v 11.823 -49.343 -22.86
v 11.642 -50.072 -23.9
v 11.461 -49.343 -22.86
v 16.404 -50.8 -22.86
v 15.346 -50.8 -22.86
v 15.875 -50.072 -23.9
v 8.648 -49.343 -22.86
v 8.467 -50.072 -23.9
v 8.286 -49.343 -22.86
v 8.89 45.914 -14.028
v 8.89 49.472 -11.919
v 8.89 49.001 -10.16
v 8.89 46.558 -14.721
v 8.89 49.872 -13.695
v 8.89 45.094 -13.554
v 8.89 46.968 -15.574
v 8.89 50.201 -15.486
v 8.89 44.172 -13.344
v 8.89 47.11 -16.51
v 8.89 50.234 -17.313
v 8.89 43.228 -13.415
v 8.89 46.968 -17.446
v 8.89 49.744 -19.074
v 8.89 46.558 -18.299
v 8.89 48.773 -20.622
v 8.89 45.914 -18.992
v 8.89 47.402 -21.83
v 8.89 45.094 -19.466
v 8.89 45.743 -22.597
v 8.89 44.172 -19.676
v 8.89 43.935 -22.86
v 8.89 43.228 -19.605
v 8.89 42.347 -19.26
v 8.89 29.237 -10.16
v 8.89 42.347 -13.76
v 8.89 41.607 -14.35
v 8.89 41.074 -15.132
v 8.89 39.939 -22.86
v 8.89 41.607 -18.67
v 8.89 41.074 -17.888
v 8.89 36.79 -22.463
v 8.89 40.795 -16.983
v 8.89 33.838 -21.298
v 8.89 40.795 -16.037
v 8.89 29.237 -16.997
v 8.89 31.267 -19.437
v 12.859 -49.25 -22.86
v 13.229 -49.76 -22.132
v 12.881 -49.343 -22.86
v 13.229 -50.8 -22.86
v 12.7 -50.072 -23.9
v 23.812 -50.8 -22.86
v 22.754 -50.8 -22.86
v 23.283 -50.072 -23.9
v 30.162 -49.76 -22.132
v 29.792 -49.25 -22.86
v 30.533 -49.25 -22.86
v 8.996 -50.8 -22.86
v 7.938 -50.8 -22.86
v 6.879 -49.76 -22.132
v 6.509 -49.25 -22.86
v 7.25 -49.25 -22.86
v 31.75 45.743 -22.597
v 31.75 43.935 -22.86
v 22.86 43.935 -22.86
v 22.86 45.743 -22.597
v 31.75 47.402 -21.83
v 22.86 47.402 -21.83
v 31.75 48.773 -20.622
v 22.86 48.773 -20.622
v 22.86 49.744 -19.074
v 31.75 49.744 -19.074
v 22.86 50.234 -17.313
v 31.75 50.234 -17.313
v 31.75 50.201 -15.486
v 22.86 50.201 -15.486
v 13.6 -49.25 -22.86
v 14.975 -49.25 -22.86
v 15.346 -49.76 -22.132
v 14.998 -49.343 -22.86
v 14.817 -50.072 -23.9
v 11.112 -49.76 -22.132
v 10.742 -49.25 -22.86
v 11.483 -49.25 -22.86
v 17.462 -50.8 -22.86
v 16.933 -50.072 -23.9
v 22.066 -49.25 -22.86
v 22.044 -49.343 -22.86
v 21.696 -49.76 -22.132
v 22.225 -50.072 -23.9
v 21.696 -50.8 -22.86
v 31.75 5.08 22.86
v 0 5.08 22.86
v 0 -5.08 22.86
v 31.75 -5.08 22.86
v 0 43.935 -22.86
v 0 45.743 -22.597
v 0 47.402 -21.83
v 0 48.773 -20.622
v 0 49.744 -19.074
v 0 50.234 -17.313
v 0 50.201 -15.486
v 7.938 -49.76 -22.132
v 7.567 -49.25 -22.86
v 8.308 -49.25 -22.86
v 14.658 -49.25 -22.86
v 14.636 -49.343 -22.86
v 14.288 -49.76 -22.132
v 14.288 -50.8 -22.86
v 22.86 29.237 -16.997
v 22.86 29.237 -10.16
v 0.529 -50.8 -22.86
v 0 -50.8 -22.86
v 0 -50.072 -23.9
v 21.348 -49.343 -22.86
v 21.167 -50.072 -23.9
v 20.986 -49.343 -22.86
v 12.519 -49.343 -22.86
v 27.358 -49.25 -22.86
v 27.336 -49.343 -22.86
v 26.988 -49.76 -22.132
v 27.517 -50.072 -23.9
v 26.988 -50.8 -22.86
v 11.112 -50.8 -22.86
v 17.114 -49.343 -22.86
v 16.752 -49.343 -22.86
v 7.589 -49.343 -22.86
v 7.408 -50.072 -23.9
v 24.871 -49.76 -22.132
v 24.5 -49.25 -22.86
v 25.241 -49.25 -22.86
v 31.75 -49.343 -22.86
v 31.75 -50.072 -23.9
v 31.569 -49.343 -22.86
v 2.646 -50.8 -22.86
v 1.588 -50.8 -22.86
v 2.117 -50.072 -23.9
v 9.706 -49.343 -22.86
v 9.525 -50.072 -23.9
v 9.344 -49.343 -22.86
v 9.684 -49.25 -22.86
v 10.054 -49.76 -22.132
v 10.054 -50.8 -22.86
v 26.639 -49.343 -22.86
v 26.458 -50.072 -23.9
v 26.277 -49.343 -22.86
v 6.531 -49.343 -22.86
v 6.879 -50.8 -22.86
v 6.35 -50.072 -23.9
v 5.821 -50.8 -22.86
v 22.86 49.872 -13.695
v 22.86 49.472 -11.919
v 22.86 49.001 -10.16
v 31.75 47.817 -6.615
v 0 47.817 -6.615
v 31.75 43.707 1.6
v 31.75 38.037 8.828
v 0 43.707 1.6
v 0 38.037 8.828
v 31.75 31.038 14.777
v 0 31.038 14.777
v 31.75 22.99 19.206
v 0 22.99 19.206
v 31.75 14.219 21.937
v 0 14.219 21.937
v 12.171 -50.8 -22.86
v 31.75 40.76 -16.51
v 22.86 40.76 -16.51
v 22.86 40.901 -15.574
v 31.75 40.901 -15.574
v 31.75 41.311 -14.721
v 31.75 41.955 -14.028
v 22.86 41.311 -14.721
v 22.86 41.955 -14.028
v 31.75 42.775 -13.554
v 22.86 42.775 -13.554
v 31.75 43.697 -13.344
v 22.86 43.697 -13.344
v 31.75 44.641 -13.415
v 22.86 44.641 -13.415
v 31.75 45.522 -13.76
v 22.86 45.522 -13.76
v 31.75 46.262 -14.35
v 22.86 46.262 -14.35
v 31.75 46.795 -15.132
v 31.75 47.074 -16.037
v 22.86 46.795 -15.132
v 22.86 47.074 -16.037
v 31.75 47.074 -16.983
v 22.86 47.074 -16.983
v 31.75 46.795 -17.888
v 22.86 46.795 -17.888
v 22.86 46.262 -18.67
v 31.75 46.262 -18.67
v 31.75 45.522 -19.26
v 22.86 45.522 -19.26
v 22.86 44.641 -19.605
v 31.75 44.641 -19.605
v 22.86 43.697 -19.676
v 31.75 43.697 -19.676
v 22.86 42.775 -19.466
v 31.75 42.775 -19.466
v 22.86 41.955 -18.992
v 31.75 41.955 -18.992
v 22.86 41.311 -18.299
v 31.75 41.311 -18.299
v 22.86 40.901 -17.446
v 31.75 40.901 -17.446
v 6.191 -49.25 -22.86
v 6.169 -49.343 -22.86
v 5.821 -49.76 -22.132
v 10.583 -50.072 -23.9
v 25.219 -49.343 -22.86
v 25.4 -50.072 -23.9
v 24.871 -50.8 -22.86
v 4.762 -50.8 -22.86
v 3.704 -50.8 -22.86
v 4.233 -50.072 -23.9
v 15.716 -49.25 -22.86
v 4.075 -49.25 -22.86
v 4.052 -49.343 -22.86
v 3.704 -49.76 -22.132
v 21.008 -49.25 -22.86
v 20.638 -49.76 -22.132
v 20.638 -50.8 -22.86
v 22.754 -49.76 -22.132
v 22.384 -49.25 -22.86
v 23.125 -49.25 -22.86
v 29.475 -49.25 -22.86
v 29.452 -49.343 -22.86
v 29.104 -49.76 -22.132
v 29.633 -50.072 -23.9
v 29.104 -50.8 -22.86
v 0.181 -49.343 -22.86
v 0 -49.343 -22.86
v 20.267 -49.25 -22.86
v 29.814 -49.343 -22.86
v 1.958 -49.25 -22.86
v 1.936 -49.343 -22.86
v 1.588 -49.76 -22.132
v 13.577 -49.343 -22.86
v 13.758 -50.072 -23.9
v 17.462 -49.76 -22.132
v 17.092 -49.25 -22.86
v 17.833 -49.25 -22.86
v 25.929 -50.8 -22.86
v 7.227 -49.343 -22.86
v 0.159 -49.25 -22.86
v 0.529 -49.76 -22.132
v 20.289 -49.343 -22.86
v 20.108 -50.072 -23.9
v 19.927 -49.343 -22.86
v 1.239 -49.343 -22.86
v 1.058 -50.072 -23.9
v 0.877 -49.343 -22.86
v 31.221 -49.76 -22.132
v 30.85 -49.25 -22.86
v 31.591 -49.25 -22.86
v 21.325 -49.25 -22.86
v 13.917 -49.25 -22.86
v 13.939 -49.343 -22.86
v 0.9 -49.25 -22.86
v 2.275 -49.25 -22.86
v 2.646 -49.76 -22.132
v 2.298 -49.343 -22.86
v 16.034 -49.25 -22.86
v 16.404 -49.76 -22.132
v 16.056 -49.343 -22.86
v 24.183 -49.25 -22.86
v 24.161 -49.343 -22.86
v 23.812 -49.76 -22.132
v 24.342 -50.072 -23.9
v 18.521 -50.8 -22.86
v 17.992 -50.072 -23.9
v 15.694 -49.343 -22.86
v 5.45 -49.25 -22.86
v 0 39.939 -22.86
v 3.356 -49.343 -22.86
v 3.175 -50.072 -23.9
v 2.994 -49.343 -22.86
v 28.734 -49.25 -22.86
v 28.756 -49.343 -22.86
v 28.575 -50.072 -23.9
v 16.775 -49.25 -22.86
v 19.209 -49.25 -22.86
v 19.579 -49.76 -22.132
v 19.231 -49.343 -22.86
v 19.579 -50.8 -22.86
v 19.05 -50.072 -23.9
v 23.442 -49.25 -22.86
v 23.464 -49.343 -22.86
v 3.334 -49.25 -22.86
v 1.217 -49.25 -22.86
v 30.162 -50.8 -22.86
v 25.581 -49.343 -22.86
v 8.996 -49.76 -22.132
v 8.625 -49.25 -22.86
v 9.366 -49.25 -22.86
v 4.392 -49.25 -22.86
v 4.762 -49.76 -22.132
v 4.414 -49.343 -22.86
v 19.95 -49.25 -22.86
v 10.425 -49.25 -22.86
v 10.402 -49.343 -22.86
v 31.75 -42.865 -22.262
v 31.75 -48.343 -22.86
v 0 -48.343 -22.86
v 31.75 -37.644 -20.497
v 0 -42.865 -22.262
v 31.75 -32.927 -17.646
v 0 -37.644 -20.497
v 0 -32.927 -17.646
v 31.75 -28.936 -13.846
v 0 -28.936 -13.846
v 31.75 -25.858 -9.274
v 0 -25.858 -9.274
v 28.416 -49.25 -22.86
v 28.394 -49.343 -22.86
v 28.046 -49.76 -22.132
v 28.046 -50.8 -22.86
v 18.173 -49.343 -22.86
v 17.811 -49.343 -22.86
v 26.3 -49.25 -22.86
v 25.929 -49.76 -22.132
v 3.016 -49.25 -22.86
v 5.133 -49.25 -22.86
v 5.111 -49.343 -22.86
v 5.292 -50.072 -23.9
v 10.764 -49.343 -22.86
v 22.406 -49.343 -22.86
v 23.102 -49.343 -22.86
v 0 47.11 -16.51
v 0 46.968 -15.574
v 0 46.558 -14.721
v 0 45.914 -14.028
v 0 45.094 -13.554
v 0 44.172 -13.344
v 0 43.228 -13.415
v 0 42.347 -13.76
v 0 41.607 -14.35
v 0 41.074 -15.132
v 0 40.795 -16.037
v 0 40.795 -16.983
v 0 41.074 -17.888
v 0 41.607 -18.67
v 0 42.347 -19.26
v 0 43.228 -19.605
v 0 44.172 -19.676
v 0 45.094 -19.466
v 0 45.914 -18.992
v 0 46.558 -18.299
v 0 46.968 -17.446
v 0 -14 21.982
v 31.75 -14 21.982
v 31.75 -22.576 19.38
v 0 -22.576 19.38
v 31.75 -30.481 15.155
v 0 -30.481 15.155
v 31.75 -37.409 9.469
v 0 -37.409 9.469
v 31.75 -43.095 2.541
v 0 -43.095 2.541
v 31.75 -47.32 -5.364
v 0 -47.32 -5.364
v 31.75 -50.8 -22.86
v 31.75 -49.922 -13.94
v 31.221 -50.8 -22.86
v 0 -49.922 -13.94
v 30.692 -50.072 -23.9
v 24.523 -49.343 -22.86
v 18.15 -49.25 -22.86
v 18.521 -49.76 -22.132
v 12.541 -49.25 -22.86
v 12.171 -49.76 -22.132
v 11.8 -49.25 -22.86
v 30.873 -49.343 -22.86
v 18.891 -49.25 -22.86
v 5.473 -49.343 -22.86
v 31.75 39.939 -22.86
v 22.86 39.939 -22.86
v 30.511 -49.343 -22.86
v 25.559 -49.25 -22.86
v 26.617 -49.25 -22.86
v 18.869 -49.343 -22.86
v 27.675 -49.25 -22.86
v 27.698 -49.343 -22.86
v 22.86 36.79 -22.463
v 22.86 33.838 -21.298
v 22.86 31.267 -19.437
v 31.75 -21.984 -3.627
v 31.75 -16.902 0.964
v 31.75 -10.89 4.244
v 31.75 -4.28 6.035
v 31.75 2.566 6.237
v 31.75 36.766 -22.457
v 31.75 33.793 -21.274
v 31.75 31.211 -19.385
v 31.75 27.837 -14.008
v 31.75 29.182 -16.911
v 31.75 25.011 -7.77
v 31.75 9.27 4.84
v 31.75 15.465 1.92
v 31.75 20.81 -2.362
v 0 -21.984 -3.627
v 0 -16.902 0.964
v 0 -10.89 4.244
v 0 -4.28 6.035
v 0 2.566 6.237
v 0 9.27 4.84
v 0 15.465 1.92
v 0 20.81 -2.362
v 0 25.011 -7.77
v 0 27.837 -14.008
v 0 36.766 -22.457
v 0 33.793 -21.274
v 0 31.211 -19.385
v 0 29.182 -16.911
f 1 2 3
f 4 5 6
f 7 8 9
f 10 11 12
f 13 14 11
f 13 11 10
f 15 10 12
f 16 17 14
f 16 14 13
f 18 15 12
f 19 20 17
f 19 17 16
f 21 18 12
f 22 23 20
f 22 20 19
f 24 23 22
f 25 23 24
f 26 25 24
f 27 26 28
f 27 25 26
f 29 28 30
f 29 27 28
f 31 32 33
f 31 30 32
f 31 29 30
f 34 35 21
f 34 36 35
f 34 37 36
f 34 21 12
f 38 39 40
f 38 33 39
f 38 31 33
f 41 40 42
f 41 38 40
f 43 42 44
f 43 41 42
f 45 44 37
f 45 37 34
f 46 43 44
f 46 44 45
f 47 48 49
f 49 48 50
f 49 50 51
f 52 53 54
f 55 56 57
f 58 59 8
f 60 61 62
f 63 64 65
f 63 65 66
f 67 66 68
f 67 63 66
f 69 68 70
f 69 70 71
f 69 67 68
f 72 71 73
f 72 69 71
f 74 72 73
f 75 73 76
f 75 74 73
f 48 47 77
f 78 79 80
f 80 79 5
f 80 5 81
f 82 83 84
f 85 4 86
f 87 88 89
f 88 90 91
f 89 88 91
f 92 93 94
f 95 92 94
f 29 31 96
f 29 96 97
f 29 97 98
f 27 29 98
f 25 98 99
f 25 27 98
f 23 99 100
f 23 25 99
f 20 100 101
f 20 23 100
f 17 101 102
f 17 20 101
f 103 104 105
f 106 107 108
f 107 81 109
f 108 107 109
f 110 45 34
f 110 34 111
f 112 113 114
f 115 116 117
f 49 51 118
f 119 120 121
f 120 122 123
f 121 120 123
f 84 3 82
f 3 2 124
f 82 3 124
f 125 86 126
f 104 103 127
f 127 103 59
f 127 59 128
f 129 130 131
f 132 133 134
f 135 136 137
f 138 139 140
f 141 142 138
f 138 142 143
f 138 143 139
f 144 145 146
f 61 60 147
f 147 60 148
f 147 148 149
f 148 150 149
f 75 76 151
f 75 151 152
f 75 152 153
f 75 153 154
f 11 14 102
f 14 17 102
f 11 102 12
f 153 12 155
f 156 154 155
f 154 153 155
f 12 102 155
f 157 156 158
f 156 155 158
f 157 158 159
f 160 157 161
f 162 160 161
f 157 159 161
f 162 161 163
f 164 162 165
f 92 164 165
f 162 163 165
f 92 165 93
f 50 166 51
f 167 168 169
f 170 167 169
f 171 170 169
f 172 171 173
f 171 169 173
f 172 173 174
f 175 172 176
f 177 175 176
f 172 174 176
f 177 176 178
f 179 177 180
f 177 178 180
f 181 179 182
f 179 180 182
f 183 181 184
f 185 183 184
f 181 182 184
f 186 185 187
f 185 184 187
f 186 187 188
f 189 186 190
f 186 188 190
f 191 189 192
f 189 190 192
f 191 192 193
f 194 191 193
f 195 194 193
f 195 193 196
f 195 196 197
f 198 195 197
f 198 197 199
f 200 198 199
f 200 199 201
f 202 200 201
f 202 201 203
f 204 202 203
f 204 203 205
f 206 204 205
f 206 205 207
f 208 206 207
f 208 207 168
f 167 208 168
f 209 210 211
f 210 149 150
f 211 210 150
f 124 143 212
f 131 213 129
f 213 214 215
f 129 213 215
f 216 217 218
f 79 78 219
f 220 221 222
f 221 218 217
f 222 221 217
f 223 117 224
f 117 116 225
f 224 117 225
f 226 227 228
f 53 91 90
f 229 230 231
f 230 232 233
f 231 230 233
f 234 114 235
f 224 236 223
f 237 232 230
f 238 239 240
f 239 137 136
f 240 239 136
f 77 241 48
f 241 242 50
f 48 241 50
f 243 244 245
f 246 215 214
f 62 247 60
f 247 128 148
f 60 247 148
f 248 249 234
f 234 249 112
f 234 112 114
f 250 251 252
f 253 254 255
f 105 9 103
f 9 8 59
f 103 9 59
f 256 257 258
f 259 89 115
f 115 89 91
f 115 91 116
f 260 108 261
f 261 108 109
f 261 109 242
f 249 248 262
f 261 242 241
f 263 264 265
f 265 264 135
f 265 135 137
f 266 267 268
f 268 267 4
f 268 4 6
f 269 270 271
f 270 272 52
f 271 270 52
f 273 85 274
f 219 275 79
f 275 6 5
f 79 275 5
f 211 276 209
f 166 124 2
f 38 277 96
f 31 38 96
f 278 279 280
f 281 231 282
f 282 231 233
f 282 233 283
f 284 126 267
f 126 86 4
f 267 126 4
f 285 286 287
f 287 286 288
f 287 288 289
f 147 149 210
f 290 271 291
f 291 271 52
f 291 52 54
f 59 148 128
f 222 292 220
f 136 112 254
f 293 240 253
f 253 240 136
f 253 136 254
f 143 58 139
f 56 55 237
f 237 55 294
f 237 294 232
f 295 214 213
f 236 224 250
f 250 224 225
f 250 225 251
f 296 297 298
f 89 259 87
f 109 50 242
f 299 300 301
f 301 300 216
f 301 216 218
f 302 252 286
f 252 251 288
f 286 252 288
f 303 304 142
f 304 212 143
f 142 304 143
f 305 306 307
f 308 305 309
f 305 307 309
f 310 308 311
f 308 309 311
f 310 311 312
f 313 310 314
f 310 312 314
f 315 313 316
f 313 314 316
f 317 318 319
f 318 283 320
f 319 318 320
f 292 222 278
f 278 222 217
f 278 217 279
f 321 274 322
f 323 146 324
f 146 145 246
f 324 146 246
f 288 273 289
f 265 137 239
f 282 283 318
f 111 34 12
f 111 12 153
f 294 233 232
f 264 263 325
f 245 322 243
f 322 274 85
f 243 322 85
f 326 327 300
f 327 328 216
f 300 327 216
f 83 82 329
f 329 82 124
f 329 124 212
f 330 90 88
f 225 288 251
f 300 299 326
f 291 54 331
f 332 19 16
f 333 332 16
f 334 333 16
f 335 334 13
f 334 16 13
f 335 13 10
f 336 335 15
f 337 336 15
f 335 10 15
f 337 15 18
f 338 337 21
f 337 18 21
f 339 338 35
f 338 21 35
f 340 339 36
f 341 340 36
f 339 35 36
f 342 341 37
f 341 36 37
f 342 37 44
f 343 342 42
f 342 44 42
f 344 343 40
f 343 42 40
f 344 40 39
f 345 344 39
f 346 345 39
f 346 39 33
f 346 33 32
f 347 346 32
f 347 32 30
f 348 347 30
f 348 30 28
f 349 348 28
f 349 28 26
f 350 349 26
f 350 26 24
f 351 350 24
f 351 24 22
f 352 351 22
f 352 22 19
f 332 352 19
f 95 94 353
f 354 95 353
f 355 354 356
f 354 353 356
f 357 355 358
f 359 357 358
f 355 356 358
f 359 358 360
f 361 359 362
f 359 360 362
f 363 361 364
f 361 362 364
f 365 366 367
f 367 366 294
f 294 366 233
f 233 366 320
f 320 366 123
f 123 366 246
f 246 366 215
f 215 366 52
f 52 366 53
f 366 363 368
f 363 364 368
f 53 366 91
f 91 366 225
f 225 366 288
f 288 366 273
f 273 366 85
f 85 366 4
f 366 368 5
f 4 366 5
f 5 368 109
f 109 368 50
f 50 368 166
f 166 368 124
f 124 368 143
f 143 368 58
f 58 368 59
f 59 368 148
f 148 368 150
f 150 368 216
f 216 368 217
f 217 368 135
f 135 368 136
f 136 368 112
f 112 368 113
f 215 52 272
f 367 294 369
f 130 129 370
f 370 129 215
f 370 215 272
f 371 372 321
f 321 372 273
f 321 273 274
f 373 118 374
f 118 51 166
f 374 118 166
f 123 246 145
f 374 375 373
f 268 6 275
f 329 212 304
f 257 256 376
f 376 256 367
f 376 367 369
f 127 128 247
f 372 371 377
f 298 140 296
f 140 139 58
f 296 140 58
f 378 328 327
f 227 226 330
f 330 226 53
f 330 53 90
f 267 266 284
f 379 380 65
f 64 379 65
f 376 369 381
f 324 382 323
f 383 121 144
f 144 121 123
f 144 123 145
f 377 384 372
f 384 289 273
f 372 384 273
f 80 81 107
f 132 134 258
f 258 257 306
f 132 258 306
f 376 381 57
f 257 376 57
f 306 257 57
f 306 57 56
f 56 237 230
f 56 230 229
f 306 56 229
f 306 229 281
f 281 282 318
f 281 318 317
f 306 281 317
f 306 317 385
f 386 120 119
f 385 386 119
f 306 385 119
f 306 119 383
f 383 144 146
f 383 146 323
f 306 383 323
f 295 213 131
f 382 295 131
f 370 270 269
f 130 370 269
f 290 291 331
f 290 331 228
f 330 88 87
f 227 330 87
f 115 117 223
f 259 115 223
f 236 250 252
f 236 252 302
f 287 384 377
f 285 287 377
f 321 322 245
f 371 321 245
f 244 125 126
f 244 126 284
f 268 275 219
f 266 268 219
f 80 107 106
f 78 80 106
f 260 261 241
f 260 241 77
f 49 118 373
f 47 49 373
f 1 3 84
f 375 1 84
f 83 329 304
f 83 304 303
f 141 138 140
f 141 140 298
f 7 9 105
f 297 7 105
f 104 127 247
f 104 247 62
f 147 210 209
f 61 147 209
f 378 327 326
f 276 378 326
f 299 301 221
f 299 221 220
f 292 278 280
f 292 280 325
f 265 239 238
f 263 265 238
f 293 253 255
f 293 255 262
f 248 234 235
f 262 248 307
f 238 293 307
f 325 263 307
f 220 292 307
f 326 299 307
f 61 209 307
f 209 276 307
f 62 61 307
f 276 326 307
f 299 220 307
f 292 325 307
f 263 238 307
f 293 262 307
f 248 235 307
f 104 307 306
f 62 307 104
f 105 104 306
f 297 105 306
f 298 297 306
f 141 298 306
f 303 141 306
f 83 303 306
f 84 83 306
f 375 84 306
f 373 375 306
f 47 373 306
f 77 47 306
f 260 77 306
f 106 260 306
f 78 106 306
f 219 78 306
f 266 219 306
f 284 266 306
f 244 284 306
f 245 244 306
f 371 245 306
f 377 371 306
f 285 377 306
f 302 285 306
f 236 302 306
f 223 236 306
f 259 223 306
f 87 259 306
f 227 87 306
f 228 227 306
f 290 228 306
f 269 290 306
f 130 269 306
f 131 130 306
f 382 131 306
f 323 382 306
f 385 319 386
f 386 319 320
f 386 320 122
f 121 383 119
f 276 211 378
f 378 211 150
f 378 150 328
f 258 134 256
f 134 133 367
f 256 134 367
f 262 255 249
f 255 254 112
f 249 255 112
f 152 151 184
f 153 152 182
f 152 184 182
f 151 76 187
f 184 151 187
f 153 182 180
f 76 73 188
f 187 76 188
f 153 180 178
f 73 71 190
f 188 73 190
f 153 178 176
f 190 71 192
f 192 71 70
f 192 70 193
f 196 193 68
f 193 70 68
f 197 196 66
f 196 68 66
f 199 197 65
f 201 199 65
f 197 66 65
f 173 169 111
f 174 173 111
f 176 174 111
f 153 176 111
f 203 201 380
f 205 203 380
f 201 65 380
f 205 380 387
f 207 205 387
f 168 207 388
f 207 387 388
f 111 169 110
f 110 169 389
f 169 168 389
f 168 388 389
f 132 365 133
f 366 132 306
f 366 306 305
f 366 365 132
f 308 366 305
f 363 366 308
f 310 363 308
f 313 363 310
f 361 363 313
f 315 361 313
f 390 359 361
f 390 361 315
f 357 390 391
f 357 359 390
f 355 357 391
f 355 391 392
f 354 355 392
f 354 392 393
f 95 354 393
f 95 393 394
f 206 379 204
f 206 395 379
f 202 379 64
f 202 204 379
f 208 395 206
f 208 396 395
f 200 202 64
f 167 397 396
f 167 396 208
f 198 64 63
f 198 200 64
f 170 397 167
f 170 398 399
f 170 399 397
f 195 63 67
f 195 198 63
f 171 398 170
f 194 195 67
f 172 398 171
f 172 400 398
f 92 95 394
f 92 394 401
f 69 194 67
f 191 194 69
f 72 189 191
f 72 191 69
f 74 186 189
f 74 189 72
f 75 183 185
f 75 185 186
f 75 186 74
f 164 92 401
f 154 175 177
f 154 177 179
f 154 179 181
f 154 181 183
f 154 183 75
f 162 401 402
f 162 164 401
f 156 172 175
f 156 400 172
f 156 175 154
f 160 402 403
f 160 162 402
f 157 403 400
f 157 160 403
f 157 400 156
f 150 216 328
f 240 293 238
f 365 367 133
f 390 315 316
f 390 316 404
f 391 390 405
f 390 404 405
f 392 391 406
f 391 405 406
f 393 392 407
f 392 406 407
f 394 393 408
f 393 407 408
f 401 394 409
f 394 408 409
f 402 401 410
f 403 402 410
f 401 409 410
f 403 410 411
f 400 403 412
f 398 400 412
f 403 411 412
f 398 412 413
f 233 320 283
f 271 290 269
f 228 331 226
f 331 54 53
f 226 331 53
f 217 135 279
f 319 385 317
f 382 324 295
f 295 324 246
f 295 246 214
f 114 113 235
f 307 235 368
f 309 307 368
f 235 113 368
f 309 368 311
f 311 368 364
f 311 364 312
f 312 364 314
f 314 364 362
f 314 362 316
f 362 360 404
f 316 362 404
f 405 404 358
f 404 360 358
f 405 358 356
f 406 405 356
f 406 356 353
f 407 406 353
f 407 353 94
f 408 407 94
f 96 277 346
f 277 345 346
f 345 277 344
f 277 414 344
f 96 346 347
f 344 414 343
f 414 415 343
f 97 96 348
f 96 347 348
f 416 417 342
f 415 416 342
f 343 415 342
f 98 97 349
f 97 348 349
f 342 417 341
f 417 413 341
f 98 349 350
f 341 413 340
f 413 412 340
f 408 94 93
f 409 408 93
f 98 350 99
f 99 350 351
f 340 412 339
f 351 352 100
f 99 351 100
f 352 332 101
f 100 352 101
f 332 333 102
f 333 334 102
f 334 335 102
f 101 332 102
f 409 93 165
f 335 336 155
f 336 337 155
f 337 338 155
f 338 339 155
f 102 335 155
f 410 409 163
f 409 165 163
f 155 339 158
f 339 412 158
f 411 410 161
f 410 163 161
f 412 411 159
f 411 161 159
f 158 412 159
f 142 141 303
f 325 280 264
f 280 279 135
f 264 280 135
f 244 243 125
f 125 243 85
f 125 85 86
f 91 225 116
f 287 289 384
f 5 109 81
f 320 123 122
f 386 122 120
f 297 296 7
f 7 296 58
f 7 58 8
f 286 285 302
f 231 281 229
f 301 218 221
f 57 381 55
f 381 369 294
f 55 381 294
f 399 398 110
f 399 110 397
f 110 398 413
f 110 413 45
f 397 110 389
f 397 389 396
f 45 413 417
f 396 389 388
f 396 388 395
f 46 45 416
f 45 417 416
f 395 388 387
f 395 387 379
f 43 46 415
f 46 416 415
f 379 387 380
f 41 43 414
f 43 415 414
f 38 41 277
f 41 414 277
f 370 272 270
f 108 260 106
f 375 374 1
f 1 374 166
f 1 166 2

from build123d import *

# Parameters (mm, degrees)
F1_DEPTH  = 31.75
F2_R      = 6.35
F3_W      = 13.97
F3_H      = 25.4
F4_DEPTH  = 12.7
F5_R      = 3.175
F6_DEPTH  = 8.891
F7_R      = 3.175
F8_DEPTH  = 8.891
F10_DEPTH = 1.27


with BuildPart() as f1:
    # F0 (on Right) → F1 (new body)
    with BuildSketch(Plane.YZ):
        with BuildLine():
            Line((5.08, 22.86), (-5.08, 22.86))
            ThreePointArc((-5.08, 22.86), (-37.4089220358, 9.4689220358), (-50.8, -22.86))
            Line((-50.8, -22.86), (-49.3431158517, -22.86))
            Line((-49.3431158517, -22.86), (-48.3434804291, -22.86))
            ThreePointArc((-48.3434804291, -22.86), (-35.2079259795, -19.1997610222), (-25.8581406946, -9.2739534884))
            ThreePointArc((-25.8581406946, -9.2739534884), (2.5656373666, 6.2371064696), (27.8365726971, -14.0084848485))
            ThreePointArc((27.8365726971, -14.0084848485), (32.4422895224, -20.410994039), (39.9394303915, -22.86))
            Line((39.9394303915, -22.86), (50.8, -22.86))
            ThreePointArc((50.8, -22.86), (37.4089220358, 9.4689220358), (5.08, 22.86))
        make_face()
        Polygon((-49.3431158517, -22.86), (-50.8, -22.86), (-50.0715579258, -23.9003230962), align=None)
    extrude(amount=F1_DEPTH)

    # F2
    f2_edges = [f1.edges().sort_by_distance(p)[0] for p in [
        (15.875, 50.8, -22.86),
    ]]
    fillet(f2_edges, radius=F2_R)

    # F3 (on face) → F4 (cut)
    with BuildSketch(Plane(origin=(0, 0, -22.86), x_dir=(1, 0, 0), z_dir=(0, 0, -1))):
        with Locations((15.875, -41.9369795426)):
            Rectangle(F3_W, F3_H)
    extrude(amount=-F4_DEPTH, mode=Mode.SUBTRACT)

    # F5 (on face) → F6 (cut, through all)
    with BuildSketch(Plane.YZ.offset(8.89)):
        with Locations((43.9345286936, -16.51)):
            Circle(F5_R)
    extrude(amount=-F6_DEPTH, mode=Mode.SUBTRACT)

    # F7 (on face) → F8 (cut, through all)
    with BuildSketch(Plane(origin=(22.86, 0, 0), x_dir=(0, -1, 0), z_dir=(-1, 0, 0))):
        with Locations((-43.9345286936, -16.51)):
            Circle(F7_R)
    extrude(amount=-F8_DEPTH, mode=Mode.SUBTRACT)

    # F9 (on face) → F10 (cut)
    with BuildSketch(Plane(origin=(0, -44.8279982961, -31.3889023298), x_dir=(1, 0, 0), z_dir=(0, -0.8191520443, -0.5735764364))):
        Polygon((0.5291666667, 10.4118672342), (0, 9.1418672342), (1.0583333333, 9.1418672342), align=None)
        Polygon((31.2208333333, 10.4118672342), (30.6916666667, 9.1418672342), (31.75, 9.1418672342), align=None)
        Polygon((30.1625, 10.4118672342), (29.6333333333, 9.1418672342), (30.6916666667, 9.1418672342), align=None)
        Polygon((29.1041666667, 10.4118672342), (28.575, 9.1418672342), (29.6333333333, 9.1418672342), align=None)
        Polygon((28.0458333333, 10.4118672342), (27.5166666667, 9.1418672342), (28.575, 9.1418672342), align=None)
        Polygon((26.9875, 10.4118672342), (26.4583333333, 9.1418672342), (27.5166666667, 9.1418672342), align=None)
        Polygon((25.9291666667, 10.4118672342), (25.4, 9.1418672342), (26.4583333333, 9.1418672342), align=None)
        Polygon((24.8708333333, 10.4118672342), (24.3416666667, 9.1418672342), (25.4, 9.1418672342), align=None)
        Polygon((23.8125, 10.4118672342), (23.2833333333, 9.1418672342), (24.3416666667, 9.1418672342), align=None)
        Polygon((22.7541666667, 10.4118672342), (22.225, 9.1418672342), (23.2833333333, 9.1418672342), align=None)
        Polygon((21.6958333333, 10.4118672342), (21.1666666667, 9.1418672342), (22.225, 9.1418672342), align=None)
        Polygon((20.6375, 10.4118672342), (20.1083333333, 9.1418672342), (21.1666666667, 9.1418672342), align=None)
        Polygon((19.5791666667, 10.4118672342), (19.05, 9.1418672342), (20.1083333333, 9.1418672342), align=None)
        Polygon((18.5208333333, 10.4118672342), (17.9916666667, 9.1418672342), (19.05, 9.1418672342), align=None)
        Polygon((17.4625, 10.4118672342), (16.9333333333, 9.1418672342), (17.9916666667, 9.1418672342), align=None)
        Polygon((16.4041666667, 10.4118672342), (15.875, 9.1418672342), (16.9333333333, 9.1418672342), align=None)
        Polygon((15.3458333333, 10.4118672342), (14.8166666667, 9.1418672342), (15.875, 9.1418672342), align=None)
        Polygon((14.2875, 10.4118672342), (13.7583333333, 9.1418672342), (14.8166666667, 9.1418672342), align=None)
        Polygon((13.2291666667, 10.4118672342), (12.7, 9.1418672342), (13.7583333333, 9.1418672342), align=None)
        Polygon((12.1708333333, 10.4118672342), (11.6416666667, 9.1418672342), (12.7, 9.1418672342), align=None)
        Polygon((11.1125, 10.4118672342), (10.5833333333, 9.1418672342), (11.6416666667, 9.1418672342), align=None)
        Polygon((10.0541666667, 10.4118672342), (9.525, 9.1418672342), (10.5833333333, 9.1418672342), align=None)
        Polygon((8.9958333333, 10.4118672342), (8.4666666667, 9.1418672342), (9.525, 9.1418672342), align=None)
        Polygon((7.9375, 10.4118672342), (7.4083333333, 9.1418672342), (8.4666666667, 9.1418672342), align=None)
        Polygon((6.8791666667, 10.4118672342), (6.35, 9.1418672342), (7.4083333333, 9.1418672342), align=None)
        Polygon((5.8208333333, 10.4118672342), (5.2916666667, 9.1418672342), (6.35, 9.1418672342), align=None)
        Polygon((4.7625, 10.4118672342), (4.2333333333, 9.1418672342), (5.2916666667, 9.1418672342), align=None)
        Polygon((3.7041666667, 10.4118672342), (3.175, 9.1418672342), (4.2333333333, 9.1418672342), align=None)
        Polygon((2.6458333333, 10.4118672342), (2.1166666667, 9.1418672342), (3.175, 9.1418672342), align=None)
        Polygon((1.5875, 10.4118672342), (1.0583333333, 9.1418672342), (2.1166666667, 9.1418672342), align=None)
    extrude(amount=-F10_DEPTH, mode=Mode.SUBTRACT)


solid = f1.part
